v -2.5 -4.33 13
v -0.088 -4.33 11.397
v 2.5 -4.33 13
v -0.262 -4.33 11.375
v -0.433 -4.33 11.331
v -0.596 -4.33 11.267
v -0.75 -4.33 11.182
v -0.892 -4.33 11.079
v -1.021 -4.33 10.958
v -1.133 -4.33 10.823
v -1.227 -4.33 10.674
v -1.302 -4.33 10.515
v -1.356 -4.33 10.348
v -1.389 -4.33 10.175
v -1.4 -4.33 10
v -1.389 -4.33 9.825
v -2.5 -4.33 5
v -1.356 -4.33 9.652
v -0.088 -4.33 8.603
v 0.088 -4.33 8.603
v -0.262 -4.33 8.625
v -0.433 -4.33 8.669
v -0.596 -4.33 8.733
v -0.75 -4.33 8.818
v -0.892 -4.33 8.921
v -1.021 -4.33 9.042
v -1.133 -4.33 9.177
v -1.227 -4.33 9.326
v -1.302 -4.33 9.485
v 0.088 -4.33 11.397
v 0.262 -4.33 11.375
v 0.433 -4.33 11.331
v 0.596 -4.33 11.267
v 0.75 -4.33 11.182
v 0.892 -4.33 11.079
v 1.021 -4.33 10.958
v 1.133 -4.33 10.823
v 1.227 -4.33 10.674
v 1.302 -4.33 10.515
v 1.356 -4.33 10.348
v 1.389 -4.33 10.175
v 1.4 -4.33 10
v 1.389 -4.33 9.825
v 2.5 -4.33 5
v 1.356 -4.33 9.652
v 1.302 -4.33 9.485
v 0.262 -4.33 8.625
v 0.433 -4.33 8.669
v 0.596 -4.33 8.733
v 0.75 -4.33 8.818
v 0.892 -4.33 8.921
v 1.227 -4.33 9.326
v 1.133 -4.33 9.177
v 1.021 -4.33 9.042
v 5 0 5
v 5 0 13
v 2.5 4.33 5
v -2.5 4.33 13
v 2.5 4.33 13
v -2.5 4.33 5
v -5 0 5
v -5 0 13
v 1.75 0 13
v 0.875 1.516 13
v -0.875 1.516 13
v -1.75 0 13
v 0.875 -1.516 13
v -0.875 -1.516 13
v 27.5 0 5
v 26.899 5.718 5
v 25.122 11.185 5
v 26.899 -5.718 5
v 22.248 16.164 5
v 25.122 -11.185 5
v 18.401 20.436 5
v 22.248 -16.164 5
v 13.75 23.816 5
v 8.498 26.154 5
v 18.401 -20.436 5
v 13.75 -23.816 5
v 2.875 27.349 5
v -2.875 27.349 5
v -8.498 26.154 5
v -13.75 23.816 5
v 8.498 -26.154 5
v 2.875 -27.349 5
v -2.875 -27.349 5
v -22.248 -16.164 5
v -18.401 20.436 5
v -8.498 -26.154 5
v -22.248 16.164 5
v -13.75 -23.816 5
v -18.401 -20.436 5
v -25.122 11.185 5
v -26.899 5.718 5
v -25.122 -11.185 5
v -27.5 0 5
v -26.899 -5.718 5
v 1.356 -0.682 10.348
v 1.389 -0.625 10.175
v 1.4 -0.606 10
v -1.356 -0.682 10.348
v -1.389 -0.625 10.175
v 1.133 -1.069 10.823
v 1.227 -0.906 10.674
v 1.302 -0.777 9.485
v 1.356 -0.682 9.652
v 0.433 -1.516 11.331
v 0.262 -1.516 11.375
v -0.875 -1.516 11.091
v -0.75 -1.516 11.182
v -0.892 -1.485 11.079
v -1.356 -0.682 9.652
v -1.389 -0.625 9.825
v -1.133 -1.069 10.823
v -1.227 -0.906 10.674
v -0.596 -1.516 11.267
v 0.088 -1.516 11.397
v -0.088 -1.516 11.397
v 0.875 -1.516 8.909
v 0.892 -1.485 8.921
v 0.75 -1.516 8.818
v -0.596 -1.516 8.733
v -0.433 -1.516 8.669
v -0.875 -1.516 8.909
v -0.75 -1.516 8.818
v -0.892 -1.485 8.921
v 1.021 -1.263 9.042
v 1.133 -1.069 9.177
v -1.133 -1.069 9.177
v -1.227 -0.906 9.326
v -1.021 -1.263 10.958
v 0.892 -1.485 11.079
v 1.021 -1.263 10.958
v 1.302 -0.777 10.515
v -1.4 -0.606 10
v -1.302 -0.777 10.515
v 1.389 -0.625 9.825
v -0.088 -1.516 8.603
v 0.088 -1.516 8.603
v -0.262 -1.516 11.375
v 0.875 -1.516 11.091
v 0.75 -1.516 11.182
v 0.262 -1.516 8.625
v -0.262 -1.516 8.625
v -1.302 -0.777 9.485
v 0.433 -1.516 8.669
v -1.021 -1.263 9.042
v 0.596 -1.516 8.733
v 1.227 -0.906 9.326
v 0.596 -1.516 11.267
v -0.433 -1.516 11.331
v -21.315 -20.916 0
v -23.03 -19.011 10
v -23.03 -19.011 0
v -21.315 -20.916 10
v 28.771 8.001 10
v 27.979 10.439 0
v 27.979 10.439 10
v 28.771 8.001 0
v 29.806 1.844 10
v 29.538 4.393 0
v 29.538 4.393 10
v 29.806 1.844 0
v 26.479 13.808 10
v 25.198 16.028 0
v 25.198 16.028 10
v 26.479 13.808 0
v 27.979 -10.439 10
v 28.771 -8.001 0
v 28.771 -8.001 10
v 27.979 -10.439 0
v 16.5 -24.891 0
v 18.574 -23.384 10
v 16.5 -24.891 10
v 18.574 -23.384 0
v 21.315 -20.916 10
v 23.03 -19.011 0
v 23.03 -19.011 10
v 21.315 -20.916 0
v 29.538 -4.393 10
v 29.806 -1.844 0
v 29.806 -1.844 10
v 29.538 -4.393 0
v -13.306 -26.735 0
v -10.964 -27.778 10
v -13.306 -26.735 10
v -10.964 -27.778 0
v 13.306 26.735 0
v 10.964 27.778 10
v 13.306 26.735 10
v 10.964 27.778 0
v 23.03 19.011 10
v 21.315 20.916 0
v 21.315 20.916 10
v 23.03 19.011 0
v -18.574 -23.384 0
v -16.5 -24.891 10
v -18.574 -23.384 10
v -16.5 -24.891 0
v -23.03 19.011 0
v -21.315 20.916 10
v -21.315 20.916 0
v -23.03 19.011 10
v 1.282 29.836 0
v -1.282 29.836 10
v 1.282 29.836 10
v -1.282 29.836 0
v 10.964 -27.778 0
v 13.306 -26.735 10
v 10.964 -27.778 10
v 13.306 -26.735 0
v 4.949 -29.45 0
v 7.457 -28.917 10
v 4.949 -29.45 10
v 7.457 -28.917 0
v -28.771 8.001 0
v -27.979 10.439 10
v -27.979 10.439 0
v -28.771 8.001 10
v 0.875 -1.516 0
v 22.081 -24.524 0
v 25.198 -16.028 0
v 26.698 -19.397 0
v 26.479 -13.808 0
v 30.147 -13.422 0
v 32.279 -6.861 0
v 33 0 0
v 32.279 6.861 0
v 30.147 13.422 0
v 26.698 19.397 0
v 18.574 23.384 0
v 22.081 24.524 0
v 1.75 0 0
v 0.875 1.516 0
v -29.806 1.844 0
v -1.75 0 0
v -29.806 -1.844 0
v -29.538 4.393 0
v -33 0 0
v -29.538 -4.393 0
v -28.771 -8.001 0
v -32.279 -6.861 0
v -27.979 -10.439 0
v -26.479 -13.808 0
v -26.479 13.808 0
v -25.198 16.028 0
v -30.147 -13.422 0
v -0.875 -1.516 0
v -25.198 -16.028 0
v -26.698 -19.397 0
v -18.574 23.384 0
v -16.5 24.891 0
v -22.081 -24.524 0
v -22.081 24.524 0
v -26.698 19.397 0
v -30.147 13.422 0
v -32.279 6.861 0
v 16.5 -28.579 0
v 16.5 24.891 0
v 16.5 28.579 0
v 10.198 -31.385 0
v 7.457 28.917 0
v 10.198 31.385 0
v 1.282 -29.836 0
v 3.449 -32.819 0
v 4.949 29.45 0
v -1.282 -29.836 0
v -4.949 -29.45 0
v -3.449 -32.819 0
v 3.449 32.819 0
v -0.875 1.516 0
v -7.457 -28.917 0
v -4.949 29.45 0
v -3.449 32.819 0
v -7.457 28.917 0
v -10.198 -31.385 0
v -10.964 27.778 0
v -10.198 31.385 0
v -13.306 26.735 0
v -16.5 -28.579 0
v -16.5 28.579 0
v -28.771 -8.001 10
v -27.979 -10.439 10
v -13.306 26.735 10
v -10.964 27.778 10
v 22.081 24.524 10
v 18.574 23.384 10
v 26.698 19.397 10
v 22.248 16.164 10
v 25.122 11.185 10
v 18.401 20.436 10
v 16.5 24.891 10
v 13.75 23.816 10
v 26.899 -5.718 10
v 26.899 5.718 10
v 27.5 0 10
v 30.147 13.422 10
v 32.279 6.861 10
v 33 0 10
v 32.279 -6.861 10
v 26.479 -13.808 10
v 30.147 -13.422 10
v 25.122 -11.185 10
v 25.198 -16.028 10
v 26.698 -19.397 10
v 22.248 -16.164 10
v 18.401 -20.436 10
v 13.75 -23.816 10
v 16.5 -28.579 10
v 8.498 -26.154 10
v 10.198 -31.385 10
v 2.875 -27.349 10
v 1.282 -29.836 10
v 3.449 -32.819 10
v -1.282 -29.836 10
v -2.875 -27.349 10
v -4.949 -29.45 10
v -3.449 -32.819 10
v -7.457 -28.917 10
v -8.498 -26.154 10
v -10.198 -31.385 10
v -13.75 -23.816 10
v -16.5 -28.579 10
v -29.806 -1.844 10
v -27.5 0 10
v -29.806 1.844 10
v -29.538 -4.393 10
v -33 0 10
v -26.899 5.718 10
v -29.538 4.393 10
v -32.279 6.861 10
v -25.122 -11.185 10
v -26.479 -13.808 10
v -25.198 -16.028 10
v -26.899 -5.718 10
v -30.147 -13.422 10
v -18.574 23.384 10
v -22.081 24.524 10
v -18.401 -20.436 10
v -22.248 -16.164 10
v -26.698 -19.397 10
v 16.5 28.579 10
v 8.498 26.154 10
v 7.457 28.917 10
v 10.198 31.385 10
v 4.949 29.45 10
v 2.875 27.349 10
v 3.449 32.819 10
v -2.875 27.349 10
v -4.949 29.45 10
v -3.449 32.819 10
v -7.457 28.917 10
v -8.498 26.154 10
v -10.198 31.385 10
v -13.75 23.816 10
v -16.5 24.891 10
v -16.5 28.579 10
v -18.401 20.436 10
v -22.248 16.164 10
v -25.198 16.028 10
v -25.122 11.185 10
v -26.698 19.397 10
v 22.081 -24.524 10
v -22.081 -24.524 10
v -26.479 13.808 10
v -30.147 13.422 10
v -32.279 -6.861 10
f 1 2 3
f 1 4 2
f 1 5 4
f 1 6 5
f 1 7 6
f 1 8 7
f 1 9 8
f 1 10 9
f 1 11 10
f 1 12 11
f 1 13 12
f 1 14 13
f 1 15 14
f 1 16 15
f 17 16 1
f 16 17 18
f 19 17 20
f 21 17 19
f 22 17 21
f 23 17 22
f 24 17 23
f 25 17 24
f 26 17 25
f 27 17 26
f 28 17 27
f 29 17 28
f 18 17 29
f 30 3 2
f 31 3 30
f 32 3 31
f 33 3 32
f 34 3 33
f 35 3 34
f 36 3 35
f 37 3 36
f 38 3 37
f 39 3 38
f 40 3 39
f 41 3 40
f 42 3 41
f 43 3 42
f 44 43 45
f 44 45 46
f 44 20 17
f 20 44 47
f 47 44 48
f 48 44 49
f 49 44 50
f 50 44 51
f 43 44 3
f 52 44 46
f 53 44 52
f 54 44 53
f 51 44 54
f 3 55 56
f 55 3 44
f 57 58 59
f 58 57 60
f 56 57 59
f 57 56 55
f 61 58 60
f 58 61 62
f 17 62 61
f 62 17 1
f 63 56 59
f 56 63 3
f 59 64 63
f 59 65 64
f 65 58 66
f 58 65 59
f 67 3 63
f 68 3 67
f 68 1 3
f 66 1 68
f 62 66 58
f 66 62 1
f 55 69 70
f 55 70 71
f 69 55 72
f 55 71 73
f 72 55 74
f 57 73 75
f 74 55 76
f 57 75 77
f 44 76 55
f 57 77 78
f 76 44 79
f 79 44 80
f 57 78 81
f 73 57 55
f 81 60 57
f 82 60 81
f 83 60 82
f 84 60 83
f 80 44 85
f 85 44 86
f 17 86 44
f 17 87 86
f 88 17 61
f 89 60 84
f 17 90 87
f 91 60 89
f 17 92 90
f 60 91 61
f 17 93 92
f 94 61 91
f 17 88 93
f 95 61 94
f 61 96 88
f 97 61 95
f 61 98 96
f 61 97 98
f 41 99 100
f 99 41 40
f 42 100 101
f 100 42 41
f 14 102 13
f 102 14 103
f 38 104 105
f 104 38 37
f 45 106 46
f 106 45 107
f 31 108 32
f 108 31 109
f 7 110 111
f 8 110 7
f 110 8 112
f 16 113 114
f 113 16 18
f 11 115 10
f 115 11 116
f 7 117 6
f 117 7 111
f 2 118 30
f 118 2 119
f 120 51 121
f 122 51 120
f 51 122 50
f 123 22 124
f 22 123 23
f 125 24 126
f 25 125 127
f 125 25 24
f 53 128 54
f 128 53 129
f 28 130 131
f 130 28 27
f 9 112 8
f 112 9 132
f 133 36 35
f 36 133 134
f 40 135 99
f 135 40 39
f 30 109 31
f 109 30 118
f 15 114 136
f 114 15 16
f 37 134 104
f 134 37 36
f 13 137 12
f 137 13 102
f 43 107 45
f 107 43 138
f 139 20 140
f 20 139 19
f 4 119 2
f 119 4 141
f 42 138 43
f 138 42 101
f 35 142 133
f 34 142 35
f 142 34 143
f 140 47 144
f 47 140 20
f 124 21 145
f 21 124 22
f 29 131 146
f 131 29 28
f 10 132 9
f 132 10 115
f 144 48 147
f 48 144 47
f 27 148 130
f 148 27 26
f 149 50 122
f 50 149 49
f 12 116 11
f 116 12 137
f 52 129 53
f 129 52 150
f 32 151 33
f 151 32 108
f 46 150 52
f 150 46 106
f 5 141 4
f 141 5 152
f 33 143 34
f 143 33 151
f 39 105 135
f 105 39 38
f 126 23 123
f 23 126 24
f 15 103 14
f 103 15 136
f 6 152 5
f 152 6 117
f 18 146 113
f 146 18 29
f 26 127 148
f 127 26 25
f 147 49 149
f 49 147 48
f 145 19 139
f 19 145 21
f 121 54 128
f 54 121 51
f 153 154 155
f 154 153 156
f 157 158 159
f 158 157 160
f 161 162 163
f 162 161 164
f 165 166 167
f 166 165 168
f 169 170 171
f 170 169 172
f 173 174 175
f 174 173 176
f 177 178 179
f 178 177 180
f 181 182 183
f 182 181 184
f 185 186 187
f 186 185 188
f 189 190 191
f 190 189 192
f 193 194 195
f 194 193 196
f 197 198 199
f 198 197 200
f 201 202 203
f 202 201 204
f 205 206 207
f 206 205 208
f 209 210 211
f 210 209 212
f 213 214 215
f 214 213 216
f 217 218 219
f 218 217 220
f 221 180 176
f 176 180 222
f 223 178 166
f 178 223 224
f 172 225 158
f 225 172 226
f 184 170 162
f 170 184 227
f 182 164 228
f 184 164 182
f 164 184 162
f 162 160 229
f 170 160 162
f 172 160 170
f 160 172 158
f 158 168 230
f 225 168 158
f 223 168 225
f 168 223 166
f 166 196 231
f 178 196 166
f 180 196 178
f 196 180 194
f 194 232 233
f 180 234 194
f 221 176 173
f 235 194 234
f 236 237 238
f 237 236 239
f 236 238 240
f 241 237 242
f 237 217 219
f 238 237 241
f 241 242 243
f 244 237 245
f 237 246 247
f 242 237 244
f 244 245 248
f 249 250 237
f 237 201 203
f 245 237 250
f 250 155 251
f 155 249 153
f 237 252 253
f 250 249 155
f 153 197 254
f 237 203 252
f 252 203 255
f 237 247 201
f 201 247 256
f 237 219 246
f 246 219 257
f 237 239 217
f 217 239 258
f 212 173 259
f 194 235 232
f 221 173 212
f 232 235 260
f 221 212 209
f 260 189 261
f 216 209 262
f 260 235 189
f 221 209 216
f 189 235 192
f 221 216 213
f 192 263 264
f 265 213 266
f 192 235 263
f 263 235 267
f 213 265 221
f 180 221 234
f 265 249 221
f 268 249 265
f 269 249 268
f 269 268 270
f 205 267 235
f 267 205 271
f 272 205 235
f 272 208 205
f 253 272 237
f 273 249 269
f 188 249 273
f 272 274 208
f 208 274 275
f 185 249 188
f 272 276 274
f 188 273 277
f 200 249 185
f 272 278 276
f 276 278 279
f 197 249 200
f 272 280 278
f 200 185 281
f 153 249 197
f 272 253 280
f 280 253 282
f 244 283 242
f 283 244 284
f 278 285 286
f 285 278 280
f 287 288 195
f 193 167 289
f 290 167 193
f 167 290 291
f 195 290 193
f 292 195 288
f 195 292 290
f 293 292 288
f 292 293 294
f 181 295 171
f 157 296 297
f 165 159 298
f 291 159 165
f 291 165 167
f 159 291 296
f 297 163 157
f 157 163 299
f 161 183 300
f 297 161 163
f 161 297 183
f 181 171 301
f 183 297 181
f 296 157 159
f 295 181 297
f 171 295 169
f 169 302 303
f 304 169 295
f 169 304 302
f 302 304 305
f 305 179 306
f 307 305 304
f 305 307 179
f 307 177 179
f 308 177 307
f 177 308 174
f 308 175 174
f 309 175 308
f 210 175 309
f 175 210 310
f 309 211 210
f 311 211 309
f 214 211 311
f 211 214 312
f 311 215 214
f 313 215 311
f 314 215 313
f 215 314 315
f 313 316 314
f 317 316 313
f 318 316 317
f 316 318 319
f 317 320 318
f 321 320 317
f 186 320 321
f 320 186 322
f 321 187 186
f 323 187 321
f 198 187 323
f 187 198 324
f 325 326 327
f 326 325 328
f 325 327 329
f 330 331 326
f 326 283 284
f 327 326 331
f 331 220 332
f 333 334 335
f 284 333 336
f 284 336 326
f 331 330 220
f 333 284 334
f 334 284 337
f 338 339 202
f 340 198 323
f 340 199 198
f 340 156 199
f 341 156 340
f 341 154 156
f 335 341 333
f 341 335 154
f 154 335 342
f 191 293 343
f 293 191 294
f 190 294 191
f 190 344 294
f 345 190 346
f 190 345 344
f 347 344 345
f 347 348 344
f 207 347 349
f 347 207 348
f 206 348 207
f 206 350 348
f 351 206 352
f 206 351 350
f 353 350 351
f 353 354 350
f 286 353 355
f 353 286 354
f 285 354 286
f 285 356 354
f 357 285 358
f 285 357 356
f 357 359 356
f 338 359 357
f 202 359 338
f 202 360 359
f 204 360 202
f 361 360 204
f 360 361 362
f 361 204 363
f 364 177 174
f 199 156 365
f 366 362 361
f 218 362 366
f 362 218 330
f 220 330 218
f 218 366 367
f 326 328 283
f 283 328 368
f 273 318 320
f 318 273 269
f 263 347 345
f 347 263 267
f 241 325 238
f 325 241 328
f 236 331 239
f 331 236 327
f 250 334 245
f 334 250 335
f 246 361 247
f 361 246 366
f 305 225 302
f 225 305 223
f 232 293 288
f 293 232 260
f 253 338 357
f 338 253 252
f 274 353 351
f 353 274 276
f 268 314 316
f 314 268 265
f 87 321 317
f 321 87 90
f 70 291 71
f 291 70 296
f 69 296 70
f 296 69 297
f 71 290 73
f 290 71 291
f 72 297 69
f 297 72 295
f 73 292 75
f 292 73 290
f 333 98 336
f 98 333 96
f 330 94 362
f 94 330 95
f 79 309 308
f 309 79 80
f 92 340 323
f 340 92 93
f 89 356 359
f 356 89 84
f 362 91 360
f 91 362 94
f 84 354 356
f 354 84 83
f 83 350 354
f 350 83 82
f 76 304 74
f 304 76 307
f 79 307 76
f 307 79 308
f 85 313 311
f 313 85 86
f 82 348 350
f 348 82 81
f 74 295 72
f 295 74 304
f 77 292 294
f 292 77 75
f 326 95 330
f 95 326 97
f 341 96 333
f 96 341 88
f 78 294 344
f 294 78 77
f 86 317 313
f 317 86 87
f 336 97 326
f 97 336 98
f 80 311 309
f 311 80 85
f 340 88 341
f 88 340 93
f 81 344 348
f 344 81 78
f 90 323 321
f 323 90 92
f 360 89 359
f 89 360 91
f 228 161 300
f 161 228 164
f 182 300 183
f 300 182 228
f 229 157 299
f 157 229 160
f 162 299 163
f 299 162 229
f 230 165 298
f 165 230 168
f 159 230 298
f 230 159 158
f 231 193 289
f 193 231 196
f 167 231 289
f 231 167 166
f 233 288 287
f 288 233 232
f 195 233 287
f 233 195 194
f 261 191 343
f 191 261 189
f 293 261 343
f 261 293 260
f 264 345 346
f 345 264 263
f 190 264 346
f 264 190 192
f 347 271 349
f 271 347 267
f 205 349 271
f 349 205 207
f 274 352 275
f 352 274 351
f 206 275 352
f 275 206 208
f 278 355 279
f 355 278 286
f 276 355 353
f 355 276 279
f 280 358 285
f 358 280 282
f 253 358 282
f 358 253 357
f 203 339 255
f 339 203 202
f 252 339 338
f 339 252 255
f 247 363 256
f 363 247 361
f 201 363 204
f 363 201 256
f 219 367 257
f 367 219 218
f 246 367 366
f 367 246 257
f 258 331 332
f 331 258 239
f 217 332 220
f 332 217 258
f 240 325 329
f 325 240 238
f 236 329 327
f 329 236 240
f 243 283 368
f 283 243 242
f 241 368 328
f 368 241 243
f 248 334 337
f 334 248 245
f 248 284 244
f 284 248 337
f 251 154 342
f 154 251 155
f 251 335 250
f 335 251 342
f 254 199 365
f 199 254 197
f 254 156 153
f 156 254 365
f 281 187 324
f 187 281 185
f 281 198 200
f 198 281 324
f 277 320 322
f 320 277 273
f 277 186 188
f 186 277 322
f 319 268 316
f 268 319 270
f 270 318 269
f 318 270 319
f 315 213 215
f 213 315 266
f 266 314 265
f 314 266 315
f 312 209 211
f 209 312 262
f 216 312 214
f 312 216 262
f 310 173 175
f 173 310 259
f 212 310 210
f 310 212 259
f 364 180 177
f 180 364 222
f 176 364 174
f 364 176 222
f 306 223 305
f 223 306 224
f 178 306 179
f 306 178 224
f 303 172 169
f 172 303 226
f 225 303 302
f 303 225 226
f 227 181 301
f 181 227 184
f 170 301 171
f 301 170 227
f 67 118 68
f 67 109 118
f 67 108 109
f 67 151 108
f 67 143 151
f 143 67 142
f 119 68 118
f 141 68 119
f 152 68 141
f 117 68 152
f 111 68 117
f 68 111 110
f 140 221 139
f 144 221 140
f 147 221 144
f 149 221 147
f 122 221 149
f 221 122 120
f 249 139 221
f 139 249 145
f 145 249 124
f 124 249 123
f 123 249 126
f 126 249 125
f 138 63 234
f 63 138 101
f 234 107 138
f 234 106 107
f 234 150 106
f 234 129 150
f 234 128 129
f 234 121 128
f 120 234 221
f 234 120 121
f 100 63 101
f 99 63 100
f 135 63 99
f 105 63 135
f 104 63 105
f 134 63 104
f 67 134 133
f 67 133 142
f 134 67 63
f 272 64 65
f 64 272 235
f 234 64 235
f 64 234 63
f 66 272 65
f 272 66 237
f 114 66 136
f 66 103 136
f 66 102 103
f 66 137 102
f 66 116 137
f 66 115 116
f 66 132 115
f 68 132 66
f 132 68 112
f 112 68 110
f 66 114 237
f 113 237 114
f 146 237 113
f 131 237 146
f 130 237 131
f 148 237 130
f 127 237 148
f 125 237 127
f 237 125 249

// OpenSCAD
//Durchmesser des Reifens
wheel_diameter = 55;
//Profilbreite
wheel_thickness = 10;
//Anzahl an Profilkerben im Reifen
wheel_profiles = 30;


difference() {
    union() {
        //Felge
        difference() {
            cylinder( d = wheel_diameter, h = 5, $fn=wheel_profiles);
        }

        //Achsenbefestigung
        translate([0,0,5])
            difference() {
                cylinder( d = 10, h = 8, $fn=6);
                //Bohrung zur Fixierung.
                translate([0,0,5])
                    rotate([90,0,0])
                        cylinder(d=2.8, h = 20, $fn=50);
            }
            
            
        //Mantel des Reifens
        difference() {
            cylinder( d = wheel_diameter + 5, h = wheel_thickness);
            translate([0,0,-1])
                cylinder( d = wheel_diameter , h = wheel_thickness + 2);
            
        }

        //Profil des Reifens
        for(rotation = [0: 360 / wheel_profiles: 360 ]) {    
            rotate([0,0,rotation])
                translate([wheel_diameter / 2 + 3, 0, 0])
                        cylinder(d=5, h = wheel_thickness, $fn=3);
        }
    };
    //Bohrung für die Achse.
    translate([0,0,-1])
        cylinder( d = 3.5, h = 38, $fn=6);
}
